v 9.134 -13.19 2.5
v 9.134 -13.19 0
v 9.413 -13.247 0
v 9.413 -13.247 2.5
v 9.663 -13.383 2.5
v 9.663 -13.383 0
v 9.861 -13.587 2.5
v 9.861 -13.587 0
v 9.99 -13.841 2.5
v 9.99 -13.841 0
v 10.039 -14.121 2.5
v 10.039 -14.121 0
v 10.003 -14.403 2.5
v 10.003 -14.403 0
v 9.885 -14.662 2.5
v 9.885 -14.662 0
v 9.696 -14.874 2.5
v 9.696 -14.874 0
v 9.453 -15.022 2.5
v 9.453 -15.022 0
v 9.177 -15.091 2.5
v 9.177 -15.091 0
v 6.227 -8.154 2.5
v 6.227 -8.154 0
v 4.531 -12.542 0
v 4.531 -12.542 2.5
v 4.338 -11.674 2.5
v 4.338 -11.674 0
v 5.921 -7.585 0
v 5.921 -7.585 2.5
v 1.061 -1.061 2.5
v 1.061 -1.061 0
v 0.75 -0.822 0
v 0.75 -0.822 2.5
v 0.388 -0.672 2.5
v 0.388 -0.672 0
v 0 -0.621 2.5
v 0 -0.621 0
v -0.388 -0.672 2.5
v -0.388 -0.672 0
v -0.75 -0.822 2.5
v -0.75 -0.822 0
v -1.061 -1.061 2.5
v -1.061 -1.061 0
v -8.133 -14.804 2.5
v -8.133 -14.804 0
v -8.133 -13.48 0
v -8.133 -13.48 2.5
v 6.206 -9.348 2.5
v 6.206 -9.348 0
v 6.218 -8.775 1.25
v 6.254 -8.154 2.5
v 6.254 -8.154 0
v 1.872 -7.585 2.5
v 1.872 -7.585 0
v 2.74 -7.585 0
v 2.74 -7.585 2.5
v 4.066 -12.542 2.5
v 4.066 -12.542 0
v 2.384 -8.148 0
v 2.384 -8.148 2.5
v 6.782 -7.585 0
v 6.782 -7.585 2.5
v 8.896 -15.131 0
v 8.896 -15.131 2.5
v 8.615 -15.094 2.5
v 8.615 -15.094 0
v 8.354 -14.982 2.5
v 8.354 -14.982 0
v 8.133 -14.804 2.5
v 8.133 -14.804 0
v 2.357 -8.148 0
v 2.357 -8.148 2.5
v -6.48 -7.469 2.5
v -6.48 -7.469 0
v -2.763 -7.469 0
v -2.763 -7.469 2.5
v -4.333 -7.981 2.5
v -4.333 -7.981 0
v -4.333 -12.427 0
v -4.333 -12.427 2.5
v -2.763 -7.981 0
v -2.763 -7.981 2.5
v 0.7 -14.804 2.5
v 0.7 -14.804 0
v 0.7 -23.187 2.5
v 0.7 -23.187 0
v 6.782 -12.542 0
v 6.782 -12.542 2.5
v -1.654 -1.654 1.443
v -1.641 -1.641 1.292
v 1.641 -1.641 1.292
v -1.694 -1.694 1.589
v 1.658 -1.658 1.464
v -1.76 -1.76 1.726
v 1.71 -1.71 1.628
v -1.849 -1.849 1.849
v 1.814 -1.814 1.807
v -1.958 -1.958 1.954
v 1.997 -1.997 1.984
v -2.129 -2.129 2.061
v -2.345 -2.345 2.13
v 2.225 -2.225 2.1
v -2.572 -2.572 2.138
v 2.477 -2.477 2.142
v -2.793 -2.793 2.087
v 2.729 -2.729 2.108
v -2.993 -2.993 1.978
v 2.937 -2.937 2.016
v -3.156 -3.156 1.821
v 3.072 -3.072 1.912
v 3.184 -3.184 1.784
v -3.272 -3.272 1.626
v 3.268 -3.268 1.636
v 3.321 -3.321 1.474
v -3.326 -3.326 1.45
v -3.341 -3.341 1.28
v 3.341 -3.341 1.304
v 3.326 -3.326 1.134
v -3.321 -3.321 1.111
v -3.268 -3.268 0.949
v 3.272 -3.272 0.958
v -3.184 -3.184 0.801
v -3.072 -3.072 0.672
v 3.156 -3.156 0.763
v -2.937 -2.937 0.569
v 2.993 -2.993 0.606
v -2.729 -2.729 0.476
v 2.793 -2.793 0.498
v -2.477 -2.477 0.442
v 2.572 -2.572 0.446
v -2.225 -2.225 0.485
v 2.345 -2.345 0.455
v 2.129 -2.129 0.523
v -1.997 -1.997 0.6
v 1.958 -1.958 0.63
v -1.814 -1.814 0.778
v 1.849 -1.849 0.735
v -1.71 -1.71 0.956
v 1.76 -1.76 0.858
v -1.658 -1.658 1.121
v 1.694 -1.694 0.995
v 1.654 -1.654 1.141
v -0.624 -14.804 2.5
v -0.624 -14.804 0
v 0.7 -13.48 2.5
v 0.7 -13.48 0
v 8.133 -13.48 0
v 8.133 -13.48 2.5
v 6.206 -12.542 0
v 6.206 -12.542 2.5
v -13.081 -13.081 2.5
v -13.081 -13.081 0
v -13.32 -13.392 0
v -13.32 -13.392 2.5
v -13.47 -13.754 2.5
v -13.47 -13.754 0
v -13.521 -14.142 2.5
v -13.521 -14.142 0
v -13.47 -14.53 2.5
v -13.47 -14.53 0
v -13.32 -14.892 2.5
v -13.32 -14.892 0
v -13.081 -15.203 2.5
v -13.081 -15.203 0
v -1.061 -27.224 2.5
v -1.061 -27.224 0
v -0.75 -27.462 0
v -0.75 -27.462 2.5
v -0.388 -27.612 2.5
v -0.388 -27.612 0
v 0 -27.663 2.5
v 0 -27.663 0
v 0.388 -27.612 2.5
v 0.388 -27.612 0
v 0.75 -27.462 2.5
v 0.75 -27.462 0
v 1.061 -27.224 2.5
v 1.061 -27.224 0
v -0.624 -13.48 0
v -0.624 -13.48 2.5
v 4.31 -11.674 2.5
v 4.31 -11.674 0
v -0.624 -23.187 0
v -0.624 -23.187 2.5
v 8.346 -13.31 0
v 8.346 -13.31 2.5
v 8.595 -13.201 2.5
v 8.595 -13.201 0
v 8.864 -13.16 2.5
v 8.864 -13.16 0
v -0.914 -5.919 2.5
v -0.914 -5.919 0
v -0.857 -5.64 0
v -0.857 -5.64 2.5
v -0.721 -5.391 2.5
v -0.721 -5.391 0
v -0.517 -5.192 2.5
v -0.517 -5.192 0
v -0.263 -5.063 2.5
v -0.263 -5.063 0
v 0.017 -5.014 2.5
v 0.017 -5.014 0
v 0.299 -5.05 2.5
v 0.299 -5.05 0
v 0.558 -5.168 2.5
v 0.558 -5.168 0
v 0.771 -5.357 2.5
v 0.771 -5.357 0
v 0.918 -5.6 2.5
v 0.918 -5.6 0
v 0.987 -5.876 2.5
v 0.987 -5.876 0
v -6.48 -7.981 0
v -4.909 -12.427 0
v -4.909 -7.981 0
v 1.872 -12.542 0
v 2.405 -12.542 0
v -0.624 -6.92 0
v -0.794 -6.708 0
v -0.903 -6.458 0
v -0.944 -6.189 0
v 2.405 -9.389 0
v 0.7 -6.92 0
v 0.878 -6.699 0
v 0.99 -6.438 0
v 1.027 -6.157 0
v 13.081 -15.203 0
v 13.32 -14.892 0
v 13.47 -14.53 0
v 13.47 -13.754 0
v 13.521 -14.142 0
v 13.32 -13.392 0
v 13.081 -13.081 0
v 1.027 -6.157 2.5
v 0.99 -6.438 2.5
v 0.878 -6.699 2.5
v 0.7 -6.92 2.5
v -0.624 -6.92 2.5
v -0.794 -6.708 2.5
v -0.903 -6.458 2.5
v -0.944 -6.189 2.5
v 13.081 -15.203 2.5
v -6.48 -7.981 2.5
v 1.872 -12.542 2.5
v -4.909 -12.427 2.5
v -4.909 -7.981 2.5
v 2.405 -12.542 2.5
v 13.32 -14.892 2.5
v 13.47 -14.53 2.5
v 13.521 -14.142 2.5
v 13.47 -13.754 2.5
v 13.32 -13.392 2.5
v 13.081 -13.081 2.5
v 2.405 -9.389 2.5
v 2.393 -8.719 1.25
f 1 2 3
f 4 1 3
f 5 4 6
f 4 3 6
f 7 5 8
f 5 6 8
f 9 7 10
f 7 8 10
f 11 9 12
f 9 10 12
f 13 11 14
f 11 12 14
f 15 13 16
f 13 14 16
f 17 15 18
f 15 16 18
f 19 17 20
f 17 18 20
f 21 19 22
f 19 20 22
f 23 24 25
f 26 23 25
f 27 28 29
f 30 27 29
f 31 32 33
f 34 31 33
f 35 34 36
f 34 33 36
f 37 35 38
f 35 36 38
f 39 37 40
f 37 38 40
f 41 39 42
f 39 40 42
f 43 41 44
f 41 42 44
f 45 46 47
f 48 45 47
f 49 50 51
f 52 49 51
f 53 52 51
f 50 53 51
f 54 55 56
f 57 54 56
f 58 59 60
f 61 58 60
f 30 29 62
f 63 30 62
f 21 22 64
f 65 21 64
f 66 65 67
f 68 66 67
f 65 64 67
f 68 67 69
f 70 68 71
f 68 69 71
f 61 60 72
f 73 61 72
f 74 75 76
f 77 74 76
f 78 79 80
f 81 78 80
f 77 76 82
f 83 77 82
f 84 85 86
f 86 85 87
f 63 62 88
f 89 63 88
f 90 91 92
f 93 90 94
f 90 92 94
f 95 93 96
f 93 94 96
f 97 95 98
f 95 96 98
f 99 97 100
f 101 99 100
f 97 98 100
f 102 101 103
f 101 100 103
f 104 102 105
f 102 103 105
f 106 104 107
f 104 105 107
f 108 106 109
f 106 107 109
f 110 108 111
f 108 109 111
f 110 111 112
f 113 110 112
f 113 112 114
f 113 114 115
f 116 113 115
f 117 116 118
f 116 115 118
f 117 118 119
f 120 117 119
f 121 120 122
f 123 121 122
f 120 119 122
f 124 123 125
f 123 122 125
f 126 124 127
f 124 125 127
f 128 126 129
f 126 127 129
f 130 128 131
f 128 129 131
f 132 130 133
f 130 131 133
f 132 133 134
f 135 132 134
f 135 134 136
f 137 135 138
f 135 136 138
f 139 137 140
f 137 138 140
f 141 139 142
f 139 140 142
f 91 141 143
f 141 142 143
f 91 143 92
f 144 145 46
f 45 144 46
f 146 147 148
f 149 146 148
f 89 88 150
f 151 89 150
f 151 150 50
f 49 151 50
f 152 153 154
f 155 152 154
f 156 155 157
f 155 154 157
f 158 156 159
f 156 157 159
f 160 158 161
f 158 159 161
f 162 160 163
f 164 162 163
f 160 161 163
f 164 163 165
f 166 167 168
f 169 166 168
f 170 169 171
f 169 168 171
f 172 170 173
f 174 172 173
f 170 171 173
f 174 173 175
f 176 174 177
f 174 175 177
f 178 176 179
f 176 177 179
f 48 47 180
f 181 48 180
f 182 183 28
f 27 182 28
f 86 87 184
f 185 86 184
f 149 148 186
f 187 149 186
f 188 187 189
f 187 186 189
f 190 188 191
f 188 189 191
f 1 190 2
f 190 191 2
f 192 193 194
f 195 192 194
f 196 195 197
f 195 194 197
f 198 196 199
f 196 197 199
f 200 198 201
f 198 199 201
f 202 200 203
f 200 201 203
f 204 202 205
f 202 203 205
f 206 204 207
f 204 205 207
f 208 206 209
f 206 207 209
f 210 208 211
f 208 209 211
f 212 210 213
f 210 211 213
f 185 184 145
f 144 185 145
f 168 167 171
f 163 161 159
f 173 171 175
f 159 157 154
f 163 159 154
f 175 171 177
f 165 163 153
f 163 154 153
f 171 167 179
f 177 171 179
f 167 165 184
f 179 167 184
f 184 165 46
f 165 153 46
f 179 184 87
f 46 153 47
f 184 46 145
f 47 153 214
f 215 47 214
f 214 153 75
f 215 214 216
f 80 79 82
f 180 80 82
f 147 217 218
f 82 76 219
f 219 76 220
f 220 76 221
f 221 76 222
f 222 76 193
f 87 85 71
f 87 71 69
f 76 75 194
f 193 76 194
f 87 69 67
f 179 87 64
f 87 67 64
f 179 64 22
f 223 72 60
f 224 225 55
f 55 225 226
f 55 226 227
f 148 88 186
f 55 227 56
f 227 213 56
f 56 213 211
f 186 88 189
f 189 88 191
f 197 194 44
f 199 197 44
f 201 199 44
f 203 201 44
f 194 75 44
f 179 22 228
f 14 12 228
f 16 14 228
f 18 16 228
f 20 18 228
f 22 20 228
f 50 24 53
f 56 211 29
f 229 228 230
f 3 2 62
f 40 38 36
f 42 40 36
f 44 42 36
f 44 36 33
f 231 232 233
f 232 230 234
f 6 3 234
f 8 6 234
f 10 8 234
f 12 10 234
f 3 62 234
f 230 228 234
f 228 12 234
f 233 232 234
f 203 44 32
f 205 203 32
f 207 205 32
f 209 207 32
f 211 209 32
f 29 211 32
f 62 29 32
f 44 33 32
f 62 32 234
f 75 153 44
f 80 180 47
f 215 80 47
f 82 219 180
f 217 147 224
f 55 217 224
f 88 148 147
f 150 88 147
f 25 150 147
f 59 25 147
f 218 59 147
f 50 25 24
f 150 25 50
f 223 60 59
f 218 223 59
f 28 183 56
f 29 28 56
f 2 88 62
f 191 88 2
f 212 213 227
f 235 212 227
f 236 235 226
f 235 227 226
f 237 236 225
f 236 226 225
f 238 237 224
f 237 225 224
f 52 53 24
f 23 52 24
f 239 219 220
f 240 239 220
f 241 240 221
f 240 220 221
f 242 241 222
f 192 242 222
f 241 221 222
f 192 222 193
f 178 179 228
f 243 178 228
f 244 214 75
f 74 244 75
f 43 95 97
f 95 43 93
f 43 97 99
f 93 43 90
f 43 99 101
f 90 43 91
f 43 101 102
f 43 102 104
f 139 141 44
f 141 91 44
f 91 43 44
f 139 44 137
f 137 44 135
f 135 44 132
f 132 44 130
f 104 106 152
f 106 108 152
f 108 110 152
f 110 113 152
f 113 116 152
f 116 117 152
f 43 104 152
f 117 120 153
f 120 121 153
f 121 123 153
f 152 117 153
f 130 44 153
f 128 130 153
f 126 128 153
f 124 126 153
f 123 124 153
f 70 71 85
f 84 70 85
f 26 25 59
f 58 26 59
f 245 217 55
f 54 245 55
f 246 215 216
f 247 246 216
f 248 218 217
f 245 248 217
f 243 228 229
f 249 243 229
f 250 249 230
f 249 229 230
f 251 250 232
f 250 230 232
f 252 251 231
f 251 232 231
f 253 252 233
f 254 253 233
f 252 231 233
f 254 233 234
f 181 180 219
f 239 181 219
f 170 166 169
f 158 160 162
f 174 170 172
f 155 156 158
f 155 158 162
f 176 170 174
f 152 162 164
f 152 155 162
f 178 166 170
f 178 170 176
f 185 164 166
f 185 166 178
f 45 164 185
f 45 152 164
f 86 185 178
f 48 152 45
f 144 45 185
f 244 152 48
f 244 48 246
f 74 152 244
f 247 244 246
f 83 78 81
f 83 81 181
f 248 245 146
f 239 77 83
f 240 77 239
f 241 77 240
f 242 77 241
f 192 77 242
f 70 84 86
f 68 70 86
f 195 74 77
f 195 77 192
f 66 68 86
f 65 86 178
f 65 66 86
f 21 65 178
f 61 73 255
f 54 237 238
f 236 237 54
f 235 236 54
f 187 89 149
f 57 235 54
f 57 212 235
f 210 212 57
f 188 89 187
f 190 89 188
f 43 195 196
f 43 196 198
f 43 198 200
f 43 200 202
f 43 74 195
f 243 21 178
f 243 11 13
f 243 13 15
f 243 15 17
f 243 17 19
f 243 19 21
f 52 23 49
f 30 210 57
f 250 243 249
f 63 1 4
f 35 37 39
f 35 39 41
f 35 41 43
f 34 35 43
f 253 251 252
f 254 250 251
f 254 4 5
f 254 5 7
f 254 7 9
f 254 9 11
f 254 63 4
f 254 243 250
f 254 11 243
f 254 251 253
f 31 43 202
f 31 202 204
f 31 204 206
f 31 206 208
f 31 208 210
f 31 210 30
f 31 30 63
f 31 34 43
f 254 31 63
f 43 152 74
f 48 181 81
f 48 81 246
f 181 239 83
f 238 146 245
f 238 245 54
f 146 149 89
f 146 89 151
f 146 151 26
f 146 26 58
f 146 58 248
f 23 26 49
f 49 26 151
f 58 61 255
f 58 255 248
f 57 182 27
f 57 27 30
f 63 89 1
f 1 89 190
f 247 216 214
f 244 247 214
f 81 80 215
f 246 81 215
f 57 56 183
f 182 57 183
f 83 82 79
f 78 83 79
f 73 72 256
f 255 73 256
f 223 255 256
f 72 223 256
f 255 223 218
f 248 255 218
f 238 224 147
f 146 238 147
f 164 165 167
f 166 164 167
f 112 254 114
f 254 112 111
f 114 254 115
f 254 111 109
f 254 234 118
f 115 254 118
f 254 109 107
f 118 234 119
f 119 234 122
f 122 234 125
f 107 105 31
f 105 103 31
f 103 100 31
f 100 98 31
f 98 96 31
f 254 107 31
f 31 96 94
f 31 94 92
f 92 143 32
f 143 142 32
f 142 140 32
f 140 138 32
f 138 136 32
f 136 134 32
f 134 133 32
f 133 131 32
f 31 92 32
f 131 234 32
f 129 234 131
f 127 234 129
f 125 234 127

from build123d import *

# Parameters (mm, degrees)
F1_DEPTH = 2.5
F2_R     = 0.85
F3_DEPTH = 12.5


with BuildPart() as f1:
    # F0 (on Top) → F1 (new body)
    with BuildSketch(Plane.XY):
        with BuildLine():
            Line((13.081475452, -13.081475452), (1.0606601718, -1.0606601718))
            ThreePointArc((1.0606601718, -1.0606601718), (0, -0.6213203436), (-1.0606601718, -1.0606601718))
            Line((-1.0606601718, -1.0606601718), (-13.081475452, -13.081475452))
            ThreePointArc((-13.081475452, -13.081475452), (-13.5208152802, -14.1421356237), (-13.081475452, -15.2027957955))
            Line((-13.081475452, -15.2027957955), (-1.0606601718, -27.2236110757))
            ThreePointArc((-1.0606601718, -27.2236110757), (0, -27.6629509039), (1.0606601718, -27.2236110757))
            Line((1.0606601718, -27.2236110757), (13.081475452, -15.2027957955))
            ThreePointArc((13.081475452, -15.2027957955), (13.5208152802, -14.1421356237), (13.081475452, -13.081475452))
        make_face()
        Polygon((-4.3332411349, -7.9814997978), (-4.3332411349, -12.4270293117), (-4.9094130099, -12.4270293117), (-4.9094130099, -7.9814997978), (-6.479508496, -7.9814997978), (-6.479508496, -7.46934702), (-2.7631456488, -7.46934702), (-2.7631456488, -7.9814997978), align=None, mode=Mode.SUBTRACT)
        with BuildLine():
            Line((-8.1334756687, -14.8039748892), (-8.1334756687, -13.4802963582))
            Line((-8.1334756687, -13.4802963582), (-0.6236797201, -13.4802963582))
            Line((-0.6236797201, -13.4802963582), (-0.6236797201, -6.9198086858))
            ThreePointArc((-0.6236797201, -6.9198086858), (-0.9032194318, -6.4583786209), (-0.9135835525, -5.9189782686))
            ThreePointArc((-0.9135835525, -5.9189782686), (0.0168397474, -5.0141534426), (0.9868078824, -5.876451129))
            ThreePointArc((0.9868078824, -5.876451129), (0.9900106564, -6.4384308628), (0.6999988109, -6.9198086858))
            Line((0.6999988109, -6.9198086858), (0.6999988109, -13.4802963582))
            Line((0.6999988109, -13.4802963582), (8.1334756687, -13.4802963582))
            ThreePointArc((8.1334756687, -13.4802963582), (8.5949057336, -13.2007566465), (9.134306086, -13.1903925258))
            ThreePointArc((9.134306086, -13.1903925258), (10.0391309119, -14.1208158258), (9.1768332255, -15.0907839607))
            ThreePointArc((9.1768332255, -15.0907839607), (8.6148534917, -15.0939867347), (8.1334756687, -14.8039748892))
            Line((8.1334756687, -14.8039748892), (0.6999988109, -14.8039748892))
            Line((0.6999988109, -14.8039748892), (0.6999988109, -23.1867600232))
            Line((0.6999988109, -23.1867600232), (-0.6236797201, -23.1867600232))
            Line((-0.6236797201, -23.1867600232), (-0.6236797201, -14.8039748892))
            Line((-0.6236797201, -14.8039748892), (-8.1334756687, -14.8039748892))
        make_face(mode=Mode.SUBTRACT)
        with BuildLine():
            Line((4.530735705, -12.5424201787), (4.0663259828, -12.5424201787))
            Line((4.0663259828, -12.5424201787), (2.3844683439, -8.1478889287))
            Line((2.3844683439, -8.1478889287), (2.3573416078, -8.1478889287))
            add(Edge.make_bspline(
                [(2.3573416078, -8.1478889287), (2.4050846634, -8.6698073314), (2.4050846634, -9.3892083731)],
                knots=[0, 0, 0, 1, 1, 1], degree=2))
            Line((2.4050846634, -9.3892083731), (2.4050846634, -12.5424201787))
            Line((2.4050846634, -12.5424201787), (1.8723155662, -12.5424201787))
            Line((1.8723155662, -12.5424201787), (1.8723155662, -7.584737887))
            Line((1.8723155662, -7.584737887), (2.7403711217, -7.584737887))
            Line((2.7403711217, -7.584737887), (4.3104666078, -11.6743646231))
            Line((4.3104666078, -11.6743646231), (4.3375933439, -11.6743646231))
            Line((4.3375933439, -11.6743646231), (5.9207096634, -7.584737887))
            Line((5.9207096634, -7.584737887), (6.7822548023, -7.584737887))
            Line((6.7822548023, -7.584737887), (6.7822548023, -12.5424201787))
            Line((6.7822548023, -12.5424201787), (6.2060829273, -12.5424201787))
            Line((6.2060829273, -12.5424201787), (6.2060829273, -9.3479757342))
            add(Edge.make_bspline(
                [(6.2060829273, -9.3479757342), (6.2060829273, -8.7989305953), (6.2538259828, -8.1543993453)],
                knots=[0, 0, 0, 1, 1, 1], degree=2))
            Line((6.2538259828, -8.1543993453), (6.2266992467, -8.1543993453))
            Line((6.2266992467, -8.1543993453), (4.530735705, -12.5424201787))
        make_face(mode=Mode.SUBTRACT)
    extrude(amount=F1_DEPTH)

    # F2 (on Right) → F3 (cut, symmetric)
    with BuildSketch(Plane.YZ):
        with Locations((-2.4908210296, 1.292226194)):
            Circle(F2_R)
    extrude(amount=F3_DEPTH, both=True, mode=Mode.SUBTRACT)


solid = f1.part
